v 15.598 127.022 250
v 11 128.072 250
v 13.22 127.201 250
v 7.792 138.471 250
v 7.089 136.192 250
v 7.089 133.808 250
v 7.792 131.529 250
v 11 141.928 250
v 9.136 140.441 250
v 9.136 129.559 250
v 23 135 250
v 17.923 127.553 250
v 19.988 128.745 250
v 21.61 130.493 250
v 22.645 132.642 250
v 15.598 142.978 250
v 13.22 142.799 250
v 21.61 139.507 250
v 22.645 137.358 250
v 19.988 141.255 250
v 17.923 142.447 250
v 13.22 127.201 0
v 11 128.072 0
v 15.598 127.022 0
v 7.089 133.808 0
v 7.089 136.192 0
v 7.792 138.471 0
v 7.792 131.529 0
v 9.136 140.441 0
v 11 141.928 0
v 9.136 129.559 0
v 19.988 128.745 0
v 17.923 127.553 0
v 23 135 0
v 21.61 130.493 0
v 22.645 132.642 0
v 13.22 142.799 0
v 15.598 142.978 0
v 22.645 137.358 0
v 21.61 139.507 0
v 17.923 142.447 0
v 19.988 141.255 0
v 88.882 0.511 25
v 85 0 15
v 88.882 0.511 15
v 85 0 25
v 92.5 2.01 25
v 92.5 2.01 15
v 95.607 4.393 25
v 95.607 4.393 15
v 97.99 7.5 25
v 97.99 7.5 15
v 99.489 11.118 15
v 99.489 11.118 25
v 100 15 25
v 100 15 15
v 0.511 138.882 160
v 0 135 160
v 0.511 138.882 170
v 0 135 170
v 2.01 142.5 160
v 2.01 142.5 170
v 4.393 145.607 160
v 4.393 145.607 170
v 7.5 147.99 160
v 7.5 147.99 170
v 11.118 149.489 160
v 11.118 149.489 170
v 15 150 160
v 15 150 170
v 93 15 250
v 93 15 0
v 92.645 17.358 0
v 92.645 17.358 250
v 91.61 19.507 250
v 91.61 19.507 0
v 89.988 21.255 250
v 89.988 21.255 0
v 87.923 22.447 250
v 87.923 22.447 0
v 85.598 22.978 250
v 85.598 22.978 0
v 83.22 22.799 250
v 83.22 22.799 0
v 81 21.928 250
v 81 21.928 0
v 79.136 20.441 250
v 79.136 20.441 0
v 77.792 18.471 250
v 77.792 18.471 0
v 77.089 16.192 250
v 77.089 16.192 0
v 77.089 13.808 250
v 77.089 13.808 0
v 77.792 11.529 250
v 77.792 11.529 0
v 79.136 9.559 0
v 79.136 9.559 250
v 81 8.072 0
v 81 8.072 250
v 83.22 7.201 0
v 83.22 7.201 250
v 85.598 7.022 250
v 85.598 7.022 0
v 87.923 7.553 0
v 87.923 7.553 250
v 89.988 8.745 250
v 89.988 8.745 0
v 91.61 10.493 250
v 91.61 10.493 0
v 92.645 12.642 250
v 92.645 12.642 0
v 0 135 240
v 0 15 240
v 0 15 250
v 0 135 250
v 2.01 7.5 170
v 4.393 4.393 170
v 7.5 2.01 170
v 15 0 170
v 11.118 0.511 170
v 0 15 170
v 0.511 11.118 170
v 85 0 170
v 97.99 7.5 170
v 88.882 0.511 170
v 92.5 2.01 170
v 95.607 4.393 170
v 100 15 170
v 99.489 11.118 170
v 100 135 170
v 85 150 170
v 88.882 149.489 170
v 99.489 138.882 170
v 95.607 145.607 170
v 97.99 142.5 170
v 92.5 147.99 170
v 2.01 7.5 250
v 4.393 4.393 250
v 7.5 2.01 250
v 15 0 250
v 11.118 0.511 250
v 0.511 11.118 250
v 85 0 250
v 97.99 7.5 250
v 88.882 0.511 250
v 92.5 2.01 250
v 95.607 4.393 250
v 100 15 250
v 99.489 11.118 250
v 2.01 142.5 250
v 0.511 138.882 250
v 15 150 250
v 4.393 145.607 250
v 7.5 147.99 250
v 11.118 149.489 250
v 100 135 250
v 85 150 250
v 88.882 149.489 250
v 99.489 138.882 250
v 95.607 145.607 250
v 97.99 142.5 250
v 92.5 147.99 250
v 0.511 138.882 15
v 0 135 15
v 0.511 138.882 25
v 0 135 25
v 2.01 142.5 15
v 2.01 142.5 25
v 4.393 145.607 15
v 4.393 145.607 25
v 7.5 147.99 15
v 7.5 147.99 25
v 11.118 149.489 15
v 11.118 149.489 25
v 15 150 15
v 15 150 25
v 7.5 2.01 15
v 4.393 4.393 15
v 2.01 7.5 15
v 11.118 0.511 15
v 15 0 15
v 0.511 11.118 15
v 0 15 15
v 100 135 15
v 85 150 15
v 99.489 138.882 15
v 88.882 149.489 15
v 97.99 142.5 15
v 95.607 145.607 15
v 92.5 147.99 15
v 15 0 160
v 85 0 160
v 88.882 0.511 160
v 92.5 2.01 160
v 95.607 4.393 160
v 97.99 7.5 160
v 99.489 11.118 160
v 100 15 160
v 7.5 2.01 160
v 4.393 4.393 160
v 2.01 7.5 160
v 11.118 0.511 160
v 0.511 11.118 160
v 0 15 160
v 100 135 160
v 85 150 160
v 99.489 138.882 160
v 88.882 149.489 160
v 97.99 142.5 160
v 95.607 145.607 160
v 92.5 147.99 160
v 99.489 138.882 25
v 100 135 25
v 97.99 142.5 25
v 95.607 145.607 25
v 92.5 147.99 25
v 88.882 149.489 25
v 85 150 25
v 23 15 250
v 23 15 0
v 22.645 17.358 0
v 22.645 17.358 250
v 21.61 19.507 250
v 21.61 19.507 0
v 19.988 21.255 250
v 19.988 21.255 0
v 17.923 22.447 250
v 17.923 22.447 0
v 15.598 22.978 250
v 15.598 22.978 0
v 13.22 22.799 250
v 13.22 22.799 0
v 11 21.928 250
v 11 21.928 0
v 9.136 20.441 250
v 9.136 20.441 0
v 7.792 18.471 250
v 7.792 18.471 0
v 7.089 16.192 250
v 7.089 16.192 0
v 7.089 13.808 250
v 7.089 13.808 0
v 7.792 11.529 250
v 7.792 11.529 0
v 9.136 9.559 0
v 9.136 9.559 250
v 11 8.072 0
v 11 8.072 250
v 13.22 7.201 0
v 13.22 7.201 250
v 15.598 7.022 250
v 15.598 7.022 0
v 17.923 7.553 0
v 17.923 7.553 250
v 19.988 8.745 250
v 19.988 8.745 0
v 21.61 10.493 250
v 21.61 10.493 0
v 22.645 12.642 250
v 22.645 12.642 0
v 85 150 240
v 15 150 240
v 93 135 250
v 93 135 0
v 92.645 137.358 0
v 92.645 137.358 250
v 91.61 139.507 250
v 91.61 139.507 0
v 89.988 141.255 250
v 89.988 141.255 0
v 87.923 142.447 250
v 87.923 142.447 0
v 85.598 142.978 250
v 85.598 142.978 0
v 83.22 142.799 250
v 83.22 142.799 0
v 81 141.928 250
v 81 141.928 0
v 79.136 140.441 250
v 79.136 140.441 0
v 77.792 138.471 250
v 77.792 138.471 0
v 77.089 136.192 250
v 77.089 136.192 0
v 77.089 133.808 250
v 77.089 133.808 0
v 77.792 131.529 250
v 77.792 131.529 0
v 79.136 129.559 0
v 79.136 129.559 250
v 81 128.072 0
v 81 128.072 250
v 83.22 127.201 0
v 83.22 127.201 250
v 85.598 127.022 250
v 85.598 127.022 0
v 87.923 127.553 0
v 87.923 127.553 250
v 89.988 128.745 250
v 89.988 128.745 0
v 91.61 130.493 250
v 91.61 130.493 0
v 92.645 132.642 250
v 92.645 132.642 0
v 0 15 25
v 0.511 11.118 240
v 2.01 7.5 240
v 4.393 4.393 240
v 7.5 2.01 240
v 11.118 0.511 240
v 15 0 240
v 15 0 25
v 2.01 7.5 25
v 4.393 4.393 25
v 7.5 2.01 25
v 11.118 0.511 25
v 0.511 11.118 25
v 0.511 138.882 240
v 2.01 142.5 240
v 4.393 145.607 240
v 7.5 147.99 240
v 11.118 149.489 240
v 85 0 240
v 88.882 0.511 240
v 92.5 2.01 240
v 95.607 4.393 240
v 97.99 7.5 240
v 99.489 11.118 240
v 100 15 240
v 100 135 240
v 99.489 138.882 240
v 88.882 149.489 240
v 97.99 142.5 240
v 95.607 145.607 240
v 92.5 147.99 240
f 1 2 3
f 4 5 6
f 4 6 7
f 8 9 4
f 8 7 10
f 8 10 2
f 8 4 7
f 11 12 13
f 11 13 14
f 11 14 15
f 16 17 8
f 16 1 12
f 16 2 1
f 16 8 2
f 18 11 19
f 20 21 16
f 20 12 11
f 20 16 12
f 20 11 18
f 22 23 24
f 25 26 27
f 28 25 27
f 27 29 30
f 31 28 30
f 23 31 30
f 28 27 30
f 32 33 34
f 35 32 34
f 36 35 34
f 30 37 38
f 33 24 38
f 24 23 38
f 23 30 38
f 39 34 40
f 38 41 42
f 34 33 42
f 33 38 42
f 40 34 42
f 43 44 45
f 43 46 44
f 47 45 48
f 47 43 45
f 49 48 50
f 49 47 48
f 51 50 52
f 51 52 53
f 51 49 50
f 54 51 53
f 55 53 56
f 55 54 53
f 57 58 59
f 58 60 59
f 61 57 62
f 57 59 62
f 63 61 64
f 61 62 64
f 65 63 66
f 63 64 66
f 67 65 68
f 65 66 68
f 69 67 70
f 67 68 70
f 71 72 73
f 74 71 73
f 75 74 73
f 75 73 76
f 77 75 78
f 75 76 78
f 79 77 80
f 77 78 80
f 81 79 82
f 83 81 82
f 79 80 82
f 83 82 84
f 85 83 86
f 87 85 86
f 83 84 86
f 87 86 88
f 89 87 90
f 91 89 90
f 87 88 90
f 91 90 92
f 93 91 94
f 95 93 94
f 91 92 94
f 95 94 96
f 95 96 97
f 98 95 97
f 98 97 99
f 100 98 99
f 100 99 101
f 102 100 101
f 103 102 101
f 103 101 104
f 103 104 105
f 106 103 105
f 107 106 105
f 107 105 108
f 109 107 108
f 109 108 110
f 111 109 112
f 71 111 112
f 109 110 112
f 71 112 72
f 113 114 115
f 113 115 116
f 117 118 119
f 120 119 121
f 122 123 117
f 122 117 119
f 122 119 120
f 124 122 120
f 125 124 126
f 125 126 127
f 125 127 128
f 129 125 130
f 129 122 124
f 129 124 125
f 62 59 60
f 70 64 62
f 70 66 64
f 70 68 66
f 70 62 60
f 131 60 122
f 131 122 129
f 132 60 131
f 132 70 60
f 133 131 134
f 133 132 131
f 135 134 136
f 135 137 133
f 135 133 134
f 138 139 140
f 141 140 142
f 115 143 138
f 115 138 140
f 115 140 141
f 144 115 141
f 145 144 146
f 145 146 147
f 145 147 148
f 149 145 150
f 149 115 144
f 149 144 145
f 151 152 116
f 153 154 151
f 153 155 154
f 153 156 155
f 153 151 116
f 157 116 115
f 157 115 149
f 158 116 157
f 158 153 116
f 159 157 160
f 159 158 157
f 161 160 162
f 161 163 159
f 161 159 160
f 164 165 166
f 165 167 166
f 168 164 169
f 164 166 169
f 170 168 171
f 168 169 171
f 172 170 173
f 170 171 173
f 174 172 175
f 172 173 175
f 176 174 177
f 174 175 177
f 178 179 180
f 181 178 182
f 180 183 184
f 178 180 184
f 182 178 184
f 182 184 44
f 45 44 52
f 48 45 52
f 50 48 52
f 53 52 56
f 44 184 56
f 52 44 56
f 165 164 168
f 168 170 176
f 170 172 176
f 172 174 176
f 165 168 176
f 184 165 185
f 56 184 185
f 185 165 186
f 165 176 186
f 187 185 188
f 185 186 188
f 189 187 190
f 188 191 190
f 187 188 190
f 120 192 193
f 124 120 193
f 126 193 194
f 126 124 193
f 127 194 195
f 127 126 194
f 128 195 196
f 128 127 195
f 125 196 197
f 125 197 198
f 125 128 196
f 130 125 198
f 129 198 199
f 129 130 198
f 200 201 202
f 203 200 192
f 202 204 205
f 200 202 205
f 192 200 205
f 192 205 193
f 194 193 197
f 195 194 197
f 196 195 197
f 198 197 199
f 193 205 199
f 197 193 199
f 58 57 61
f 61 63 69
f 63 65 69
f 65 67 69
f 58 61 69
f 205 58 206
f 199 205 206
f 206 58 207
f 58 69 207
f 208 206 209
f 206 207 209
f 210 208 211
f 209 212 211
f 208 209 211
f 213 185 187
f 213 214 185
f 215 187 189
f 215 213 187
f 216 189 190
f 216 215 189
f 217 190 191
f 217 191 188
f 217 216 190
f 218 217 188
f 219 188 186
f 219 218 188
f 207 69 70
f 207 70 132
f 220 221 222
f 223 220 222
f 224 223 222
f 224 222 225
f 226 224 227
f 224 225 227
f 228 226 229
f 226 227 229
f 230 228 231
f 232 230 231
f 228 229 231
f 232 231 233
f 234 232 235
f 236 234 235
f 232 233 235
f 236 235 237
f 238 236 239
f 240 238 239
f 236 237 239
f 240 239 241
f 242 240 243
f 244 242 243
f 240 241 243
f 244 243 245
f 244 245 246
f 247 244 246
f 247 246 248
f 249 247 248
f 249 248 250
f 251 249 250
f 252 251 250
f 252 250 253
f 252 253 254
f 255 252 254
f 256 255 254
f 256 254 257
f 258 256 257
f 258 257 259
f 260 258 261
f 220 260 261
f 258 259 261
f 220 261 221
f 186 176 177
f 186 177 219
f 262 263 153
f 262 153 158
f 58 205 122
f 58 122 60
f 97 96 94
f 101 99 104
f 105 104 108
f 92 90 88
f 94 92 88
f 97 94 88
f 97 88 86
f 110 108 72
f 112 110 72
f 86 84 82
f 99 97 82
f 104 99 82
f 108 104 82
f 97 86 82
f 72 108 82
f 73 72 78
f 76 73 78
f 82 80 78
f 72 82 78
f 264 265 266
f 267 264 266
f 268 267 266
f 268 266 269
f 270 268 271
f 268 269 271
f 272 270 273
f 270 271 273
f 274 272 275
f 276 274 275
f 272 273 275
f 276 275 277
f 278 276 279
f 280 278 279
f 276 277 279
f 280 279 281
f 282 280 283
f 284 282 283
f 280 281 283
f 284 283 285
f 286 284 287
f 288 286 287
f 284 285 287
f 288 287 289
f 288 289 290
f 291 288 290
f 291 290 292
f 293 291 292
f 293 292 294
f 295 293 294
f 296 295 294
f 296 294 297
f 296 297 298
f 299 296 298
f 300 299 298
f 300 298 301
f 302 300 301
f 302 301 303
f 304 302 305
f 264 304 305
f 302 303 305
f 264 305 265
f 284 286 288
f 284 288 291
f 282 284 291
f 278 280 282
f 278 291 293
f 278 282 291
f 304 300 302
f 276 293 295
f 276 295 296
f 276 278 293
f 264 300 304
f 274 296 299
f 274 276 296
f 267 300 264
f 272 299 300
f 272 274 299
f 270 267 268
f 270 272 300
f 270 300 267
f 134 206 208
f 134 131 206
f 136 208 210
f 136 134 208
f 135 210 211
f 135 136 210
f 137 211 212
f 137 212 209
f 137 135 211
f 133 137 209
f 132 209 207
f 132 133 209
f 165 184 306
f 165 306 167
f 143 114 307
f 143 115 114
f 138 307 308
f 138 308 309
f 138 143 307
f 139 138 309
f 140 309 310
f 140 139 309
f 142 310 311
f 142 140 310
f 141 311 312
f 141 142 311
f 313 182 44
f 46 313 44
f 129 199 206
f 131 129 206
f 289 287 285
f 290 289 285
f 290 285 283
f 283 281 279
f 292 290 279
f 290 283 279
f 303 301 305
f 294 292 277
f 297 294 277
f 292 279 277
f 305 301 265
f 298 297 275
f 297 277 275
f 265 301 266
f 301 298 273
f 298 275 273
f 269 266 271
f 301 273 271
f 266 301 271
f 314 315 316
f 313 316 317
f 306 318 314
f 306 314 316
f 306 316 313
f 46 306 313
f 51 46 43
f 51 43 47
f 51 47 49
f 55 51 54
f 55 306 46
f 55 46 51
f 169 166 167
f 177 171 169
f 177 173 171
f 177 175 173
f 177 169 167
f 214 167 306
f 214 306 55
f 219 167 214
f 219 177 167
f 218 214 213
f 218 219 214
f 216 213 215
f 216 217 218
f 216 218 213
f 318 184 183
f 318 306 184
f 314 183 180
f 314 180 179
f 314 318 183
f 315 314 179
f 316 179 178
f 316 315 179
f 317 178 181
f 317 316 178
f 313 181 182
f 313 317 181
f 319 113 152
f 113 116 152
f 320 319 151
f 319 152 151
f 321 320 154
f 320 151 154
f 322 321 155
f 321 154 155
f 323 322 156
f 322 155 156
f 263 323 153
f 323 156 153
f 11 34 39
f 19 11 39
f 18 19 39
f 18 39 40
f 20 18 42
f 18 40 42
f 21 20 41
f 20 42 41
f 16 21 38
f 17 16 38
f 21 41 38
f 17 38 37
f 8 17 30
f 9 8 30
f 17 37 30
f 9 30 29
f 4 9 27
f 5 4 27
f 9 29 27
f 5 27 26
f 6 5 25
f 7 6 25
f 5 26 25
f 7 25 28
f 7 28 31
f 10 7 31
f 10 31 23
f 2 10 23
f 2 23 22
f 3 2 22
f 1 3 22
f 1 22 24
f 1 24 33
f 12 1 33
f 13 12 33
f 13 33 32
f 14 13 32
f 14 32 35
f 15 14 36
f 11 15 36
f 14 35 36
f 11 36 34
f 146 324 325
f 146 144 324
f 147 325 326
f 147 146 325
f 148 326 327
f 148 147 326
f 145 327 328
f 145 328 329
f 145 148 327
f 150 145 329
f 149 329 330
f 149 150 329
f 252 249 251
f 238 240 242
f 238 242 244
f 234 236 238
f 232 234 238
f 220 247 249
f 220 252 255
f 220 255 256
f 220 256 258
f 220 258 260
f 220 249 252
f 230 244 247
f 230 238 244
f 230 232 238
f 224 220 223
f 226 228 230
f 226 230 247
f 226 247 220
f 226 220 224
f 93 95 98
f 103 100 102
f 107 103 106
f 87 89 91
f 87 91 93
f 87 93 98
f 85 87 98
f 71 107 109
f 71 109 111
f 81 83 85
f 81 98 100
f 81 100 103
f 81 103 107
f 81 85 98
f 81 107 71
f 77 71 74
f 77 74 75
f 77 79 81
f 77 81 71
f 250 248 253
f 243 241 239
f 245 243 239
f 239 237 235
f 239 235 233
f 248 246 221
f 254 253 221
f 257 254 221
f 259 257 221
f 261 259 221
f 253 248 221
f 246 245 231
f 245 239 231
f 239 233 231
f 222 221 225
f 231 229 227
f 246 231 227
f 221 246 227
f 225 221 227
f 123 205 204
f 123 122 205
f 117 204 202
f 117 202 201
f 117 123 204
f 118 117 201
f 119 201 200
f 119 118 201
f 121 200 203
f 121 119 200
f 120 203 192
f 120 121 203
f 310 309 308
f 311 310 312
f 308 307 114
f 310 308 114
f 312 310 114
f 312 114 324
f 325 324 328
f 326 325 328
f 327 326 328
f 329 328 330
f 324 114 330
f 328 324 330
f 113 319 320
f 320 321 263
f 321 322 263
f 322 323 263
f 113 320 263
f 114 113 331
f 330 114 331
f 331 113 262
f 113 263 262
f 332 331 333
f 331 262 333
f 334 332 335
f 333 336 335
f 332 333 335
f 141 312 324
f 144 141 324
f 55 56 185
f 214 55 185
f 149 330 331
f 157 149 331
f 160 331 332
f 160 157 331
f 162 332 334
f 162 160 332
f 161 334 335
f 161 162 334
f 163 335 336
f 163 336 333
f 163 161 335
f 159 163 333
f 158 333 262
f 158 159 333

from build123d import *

# Parameters (mm, degrees)
BOX_W             = 100
BOX_H             = 150
BOX_DEPTH         = 10
FILLET_R          = 15
BOX001_W          = 100
BOX001_H          = 150
BOX001_DEPTH      = 10
FILLET001_R       = 15
BOX002_W          = 100
BOX002_H          = 150
BOX002_DEPTH      = 10
FILLET002_R       = 15
CYLINDER_R        = 8
CYLINDER_DEPTH    = 250
CYLINDER001_R     = 8
CYLINDER001_DEPTH = 250
CYLINDER002_R     = 8
CYLINDER002_DEPTH = 250
CYLINDER003_R     = 8
CYLINDER003_DEPTH = 250


with BuildPart() as baldaredondeada1:
    # Box → Box (new body)
    with BuildSketch(Plane.XY):
        with Locations((50, 75)):
            Rectangle(BOX_W, BOX_H)
    extrude(amount=BOX_DEPTH)

    # Fillet
    fillet_edges = [baldaredondeada1.edges().sort_by_distance(p)[0] for p in [
        (0, 0, 5),
        (0, 150, 5),
        (100, 0, 5),
        (100, 150, 5),
    ]]
    fillet(fillet_edges, radius=FILLET_R)


with BuildPart() as baldaredondeada1_1:
    # Fillet placement: moved
    add(baldaredondeada1.part.moved(Location((0, 0, 240))))


with BuildPart() as baldaredondeada2:
    # Box001 → Box001 (new body)
    with BuildSketch(Plane.XY):
        with Locations((50, 75)):
            Rectangle(BOX001_W, BOX001_H)
    extrude(amount=BOX001_DEPTH)

    # Fillet001
    fillet001_edges = [baldaredondeada2.edges().sort_by_distance(p)[0] for p in [
        (0, 0, 5),
        (0, 150, 5),
        (100, 0, 5),
        (100, 150, 5),
    ]]
    fillet(fillet001_edges, radius=FILLET001_R)


with BuildPart() as baldaredondeada2_1:
    # Fillet001 placement: moved
    add(baldaredondeada2.part.moved(Location((0, 0, 160))))


with BuildPart() as baldaredondeada3:
    # Box002 → Box002 (new body)
    with BuildSketch(Plane.XY):
        with Locations((50, 75)):
            Rectangle(BOX002_W, BOX002_H)
    extrude(amount=BOX002_DEPTH)

    # Fillet002
    fillet002_edges = [baldaredondeada3.edges().sort_by_distance(p)[0] for p in [
        (0, 0, 5),
        (0, 150, 5),
        (100, 0, 5),
        (100, 150, 5),
    ]]
    fillet(fillet002_edges, radius=FILLET002_R)


with BuildPart() as baldaredondeada3_1:
    # Fillet002 placement: moved
    add(baldaredondeada3.part.moved(Location((0, 0, 15))))


with BuildPart() as pata1:
    # Cylinder → Cylinder (new body)
    with BuildSketch(Plane(origin=(15, 15, 0), x_dir=(1, 0, 0), z_dir=(0, 0, 1))):
        Circle(CYLINDER_R)
    extrude(amount=CYLINDER_DEPTH)


with BuildPart() as pata002:
    # Cylinder001 → Cylinder001 (new body)
    with BuildSketch(Plane(origin=(85, 15, 0), x_dir=(1, 0, 0), z_dir=(0, 0, 1))):
        Circle(CYLINDER001_R)
    extrude(amount=CYLINDER001_DEPTH)


with BuildPart() as pata003:
    # Cylinder002 → Cylinder002 (new body)
    with BuildSketch(Plane(origin=(85, 135, 0), x_dir=(1, 0, 0), z_dir=(0, 0, 1))):
        Circle(CYLINDER002_R)
    extrude(amount=CYLINDER002_DEPTH)


with BuildPart() as pata004:
    # Cylinder003 → Cylinder003 (new body)
    with BuildSketch(Plane(origin=(15, 135, 0), x_dir=(1, 0, 0), z_dir=(0, 0, 1))):
        Circle(CYLINDER003_R)
    extrude(amount=CYLINDER003_DEPTH)


solid = Compound([baldaredondeada1_1.part, baldaredondeada2_1.part, baldaredondeada3_1.part, pata1.part, pata002.part, pata003.part, pata004.part])
